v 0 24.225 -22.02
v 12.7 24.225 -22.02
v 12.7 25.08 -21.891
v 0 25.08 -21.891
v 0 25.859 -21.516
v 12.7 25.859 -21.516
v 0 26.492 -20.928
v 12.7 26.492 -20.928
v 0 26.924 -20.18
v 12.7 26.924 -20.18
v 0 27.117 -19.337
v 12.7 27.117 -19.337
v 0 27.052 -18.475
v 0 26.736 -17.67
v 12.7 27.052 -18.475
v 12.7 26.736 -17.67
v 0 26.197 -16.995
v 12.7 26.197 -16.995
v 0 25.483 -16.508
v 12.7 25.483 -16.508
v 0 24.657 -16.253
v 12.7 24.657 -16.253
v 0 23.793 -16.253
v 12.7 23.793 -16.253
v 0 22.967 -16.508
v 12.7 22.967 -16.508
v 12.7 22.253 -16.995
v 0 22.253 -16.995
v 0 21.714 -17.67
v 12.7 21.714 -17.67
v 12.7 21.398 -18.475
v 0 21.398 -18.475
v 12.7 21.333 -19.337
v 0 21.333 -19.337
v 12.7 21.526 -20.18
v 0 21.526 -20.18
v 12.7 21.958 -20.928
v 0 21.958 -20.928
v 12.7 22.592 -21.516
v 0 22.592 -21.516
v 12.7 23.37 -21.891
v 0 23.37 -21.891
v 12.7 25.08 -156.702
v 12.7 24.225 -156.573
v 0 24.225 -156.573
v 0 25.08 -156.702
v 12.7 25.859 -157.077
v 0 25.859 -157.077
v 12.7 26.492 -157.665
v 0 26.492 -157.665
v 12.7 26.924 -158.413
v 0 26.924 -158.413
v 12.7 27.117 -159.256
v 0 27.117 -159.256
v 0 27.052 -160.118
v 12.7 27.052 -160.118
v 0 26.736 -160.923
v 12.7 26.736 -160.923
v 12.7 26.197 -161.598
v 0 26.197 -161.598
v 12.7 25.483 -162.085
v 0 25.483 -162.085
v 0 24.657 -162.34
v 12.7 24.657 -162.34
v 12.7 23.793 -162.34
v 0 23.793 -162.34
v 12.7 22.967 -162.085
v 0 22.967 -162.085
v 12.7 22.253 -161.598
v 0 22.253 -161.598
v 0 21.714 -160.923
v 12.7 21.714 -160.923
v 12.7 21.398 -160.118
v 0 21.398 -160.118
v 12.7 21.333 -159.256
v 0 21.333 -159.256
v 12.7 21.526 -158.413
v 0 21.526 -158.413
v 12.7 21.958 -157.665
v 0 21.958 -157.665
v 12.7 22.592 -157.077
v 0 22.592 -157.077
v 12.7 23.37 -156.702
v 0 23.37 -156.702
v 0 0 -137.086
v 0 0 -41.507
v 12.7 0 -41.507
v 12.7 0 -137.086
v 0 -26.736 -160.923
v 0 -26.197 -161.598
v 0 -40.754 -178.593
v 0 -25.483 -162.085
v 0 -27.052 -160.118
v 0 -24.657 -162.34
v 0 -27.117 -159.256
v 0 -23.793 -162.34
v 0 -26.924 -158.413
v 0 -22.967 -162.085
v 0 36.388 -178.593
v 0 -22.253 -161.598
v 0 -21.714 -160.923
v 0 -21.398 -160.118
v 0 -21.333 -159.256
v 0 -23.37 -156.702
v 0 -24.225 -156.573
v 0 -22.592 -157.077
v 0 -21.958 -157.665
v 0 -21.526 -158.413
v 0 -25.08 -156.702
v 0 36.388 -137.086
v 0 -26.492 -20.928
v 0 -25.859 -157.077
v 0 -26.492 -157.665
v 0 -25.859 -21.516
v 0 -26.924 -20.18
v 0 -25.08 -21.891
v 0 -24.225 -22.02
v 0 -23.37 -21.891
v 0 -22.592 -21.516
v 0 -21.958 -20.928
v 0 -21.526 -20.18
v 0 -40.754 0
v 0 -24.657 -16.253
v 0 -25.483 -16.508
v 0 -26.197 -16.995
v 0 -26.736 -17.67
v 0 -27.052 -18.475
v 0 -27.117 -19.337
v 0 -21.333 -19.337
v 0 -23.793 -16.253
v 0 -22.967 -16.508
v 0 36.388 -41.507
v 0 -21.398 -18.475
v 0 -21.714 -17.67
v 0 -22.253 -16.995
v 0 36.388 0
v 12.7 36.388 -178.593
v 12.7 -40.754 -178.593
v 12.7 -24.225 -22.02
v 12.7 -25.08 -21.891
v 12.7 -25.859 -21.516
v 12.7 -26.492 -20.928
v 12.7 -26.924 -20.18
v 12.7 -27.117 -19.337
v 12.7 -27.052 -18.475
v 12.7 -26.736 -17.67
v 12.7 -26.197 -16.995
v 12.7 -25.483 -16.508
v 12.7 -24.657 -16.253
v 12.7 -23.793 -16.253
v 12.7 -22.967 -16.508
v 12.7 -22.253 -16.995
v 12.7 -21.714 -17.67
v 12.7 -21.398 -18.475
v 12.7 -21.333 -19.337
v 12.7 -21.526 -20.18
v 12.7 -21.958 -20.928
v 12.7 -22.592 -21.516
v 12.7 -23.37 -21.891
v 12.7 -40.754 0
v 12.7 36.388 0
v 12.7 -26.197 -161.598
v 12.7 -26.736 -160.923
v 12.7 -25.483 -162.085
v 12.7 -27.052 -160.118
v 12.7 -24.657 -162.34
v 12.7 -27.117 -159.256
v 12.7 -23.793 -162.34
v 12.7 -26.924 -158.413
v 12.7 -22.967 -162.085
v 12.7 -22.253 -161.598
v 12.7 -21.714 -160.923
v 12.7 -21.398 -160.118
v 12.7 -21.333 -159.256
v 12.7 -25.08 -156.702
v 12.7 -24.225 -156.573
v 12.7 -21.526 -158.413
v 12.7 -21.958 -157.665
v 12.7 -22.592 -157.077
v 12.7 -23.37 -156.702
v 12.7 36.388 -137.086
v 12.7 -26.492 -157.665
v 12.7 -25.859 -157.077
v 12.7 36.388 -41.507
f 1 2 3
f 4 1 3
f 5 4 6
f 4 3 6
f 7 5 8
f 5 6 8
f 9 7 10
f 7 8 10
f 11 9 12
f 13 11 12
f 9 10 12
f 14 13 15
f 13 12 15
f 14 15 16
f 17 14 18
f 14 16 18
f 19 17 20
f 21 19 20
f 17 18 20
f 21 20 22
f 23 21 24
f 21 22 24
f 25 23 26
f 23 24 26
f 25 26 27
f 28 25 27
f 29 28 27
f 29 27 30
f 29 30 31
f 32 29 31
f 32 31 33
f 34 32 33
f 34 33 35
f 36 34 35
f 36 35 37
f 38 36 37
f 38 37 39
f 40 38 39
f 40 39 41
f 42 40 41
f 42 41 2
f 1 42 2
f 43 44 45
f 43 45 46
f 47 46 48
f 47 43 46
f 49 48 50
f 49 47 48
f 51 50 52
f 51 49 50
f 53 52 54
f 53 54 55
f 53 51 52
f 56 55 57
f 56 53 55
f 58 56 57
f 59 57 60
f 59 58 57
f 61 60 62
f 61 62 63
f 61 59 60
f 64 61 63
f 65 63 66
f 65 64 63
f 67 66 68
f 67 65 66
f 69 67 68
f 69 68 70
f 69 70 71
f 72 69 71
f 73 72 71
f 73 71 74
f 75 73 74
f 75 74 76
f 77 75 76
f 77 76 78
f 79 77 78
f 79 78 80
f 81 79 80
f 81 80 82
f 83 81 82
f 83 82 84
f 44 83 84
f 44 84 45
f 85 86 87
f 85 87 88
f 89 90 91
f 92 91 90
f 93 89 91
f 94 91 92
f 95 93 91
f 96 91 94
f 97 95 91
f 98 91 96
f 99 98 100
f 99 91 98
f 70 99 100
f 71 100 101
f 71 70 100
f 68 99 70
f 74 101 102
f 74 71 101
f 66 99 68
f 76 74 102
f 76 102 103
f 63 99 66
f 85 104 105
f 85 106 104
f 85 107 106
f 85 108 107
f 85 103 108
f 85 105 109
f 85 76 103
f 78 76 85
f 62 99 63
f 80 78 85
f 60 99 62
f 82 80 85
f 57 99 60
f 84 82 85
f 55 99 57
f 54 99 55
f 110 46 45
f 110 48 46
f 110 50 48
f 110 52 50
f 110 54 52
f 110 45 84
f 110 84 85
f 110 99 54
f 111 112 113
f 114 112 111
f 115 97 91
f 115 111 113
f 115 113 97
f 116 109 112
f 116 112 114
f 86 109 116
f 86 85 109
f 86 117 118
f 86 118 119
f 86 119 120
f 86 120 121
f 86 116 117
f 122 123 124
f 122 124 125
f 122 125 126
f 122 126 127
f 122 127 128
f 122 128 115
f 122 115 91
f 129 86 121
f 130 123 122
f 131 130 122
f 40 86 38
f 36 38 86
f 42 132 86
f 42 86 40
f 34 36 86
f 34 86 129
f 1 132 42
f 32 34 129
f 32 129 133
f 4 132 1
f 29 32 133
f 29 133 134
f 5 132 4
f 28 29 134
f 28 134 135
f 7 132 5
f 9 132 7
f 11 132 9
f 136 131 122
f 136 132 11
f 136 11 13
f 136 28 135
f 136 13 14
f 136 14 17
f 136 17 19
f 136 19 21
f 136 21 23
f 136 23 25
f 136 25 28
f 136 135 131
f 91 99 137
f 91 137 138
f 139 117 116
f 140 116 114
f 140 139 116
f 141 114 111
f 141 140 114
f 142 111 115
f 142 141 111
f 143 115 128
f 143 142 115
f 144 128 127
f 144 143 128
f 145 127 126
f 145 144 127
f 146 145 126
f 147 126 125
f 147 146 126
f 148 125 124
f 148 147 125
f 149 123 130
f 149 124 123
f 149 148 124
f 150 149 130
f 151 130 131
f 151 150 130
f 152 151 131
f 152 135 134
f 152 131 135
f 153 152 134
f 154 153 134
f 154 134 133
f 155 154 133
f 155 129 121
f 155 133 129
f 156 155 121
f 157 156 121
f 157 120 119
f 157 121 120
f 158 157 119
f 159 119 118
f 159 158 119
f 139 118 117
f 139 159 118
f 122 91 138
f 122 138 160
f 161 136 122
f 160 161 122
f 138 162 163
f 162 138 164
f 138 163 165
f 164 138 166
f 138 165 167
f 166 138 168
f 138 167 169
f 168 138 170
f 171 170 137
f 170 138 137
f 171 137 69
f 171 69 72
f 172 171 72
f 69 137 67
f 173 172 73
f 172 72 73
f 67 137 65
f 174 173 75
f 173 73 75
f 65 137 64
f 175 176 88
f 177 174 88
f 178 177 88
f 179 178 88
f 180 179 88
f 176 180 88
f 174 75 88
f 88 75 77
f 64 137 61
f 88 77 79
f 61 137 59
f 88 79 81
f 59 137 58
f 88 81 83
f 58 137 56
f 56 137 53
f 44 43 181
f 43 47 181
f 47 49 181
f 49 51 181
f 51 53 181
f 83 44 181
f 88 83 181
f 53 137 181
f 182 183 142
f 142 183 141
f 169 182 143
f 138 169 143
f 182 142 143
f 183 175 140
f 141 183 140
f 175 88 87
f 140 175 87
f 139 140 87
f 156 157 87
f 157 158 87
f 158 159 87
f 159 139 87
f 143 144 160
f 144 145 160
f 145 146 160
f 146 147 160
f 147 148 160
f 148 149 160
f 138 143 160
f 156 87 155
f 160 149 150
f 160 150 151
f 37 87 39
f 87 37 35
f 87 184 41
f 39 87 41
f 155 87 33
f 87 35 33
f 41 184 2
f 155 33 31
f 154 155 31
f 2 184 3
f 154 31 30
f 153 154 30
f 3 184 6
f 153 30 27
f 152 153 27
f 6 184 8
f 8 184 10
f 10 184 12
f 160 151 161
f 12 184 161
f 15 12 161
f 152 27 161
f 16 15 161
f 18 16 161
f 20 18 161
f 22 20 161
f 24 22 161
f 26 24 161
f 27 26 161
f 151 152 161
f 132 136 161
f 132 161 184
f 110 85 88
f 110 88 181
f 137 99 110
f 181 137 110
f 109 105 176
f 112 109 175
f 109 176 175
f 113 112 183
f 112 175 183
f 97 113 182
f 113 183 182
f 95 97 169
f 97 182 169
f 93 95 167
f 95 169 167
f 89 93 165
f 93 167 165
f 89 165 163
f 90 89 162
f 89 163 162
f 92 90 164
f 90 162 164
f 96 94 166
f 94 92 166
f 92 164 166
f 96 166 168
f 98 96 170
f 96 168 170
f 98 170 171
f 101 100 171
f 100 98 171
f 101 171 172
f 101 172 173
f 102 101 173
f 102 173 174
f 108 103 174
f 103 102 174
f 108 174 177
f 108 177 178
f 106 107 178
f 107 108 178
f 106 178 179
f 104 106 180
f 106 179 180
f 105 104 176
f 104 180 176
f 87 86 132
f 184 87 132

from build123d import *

# Parameters (mm, degrees)
SKETCH1_W           = 41.507340187
SKETCH1_H           = 36.387640449
BOSS_EXTRUDE1_DEPTH = 12.7
SKETCH2_R           = 2.899735459
CUT_EXTRUDE1_DEPTH  = 99.974975464


with BuildPart() as part:
    # Sketch1 → Boss-Extrude1 (new body)
    with BuildSketch(Plane(origin=(0, 0, 0), x_dir=(0, 0, -1), z_dir=(1, 0, 0))):
        with Locations((20.753670094, 18.193820225)):
            Rectangle(SKETCH1_W, SKETCH1_H)
        Polygon((41.507340187, 0), (0, 0), (0, -40.754157303), (89.29644131, -40.754157303), (89.29644131, 0), align=None)
    extrude(amount=BOSS_EXTRUDE1_DEPTH)

    # Sketch2 → Cut-Extrude1 (cut, through all)
    with BuildSketch(Plane(origin=(12.7, 0, 0), x_dir=(0, 0, -1), z_dir=(1, 0, 0))):
        with Locations((19.12019242, 24.225046644)):
            Circle(SKETCH2_R)
    cut_extrude1 = extrude(amount=-CUT_EXTRUDE1_DEPTH, mode=Mode.SUBTRACT)

    # Mirror1: Cut-Extrude1 across plane
    add(cut_extrude1.mirror(Plane.ZX), mode=Mode.SUBTRACT)

    # Mirror2: part across plane


with BuildPart() as part_1:
    add(part.part)
    add(part.part.mirror(Plane(origin=(12.7, 0, -89.29644131), x_dir=(1, 0, 0), z_dir=(0, 0, -1))))


solid = part_1.part
